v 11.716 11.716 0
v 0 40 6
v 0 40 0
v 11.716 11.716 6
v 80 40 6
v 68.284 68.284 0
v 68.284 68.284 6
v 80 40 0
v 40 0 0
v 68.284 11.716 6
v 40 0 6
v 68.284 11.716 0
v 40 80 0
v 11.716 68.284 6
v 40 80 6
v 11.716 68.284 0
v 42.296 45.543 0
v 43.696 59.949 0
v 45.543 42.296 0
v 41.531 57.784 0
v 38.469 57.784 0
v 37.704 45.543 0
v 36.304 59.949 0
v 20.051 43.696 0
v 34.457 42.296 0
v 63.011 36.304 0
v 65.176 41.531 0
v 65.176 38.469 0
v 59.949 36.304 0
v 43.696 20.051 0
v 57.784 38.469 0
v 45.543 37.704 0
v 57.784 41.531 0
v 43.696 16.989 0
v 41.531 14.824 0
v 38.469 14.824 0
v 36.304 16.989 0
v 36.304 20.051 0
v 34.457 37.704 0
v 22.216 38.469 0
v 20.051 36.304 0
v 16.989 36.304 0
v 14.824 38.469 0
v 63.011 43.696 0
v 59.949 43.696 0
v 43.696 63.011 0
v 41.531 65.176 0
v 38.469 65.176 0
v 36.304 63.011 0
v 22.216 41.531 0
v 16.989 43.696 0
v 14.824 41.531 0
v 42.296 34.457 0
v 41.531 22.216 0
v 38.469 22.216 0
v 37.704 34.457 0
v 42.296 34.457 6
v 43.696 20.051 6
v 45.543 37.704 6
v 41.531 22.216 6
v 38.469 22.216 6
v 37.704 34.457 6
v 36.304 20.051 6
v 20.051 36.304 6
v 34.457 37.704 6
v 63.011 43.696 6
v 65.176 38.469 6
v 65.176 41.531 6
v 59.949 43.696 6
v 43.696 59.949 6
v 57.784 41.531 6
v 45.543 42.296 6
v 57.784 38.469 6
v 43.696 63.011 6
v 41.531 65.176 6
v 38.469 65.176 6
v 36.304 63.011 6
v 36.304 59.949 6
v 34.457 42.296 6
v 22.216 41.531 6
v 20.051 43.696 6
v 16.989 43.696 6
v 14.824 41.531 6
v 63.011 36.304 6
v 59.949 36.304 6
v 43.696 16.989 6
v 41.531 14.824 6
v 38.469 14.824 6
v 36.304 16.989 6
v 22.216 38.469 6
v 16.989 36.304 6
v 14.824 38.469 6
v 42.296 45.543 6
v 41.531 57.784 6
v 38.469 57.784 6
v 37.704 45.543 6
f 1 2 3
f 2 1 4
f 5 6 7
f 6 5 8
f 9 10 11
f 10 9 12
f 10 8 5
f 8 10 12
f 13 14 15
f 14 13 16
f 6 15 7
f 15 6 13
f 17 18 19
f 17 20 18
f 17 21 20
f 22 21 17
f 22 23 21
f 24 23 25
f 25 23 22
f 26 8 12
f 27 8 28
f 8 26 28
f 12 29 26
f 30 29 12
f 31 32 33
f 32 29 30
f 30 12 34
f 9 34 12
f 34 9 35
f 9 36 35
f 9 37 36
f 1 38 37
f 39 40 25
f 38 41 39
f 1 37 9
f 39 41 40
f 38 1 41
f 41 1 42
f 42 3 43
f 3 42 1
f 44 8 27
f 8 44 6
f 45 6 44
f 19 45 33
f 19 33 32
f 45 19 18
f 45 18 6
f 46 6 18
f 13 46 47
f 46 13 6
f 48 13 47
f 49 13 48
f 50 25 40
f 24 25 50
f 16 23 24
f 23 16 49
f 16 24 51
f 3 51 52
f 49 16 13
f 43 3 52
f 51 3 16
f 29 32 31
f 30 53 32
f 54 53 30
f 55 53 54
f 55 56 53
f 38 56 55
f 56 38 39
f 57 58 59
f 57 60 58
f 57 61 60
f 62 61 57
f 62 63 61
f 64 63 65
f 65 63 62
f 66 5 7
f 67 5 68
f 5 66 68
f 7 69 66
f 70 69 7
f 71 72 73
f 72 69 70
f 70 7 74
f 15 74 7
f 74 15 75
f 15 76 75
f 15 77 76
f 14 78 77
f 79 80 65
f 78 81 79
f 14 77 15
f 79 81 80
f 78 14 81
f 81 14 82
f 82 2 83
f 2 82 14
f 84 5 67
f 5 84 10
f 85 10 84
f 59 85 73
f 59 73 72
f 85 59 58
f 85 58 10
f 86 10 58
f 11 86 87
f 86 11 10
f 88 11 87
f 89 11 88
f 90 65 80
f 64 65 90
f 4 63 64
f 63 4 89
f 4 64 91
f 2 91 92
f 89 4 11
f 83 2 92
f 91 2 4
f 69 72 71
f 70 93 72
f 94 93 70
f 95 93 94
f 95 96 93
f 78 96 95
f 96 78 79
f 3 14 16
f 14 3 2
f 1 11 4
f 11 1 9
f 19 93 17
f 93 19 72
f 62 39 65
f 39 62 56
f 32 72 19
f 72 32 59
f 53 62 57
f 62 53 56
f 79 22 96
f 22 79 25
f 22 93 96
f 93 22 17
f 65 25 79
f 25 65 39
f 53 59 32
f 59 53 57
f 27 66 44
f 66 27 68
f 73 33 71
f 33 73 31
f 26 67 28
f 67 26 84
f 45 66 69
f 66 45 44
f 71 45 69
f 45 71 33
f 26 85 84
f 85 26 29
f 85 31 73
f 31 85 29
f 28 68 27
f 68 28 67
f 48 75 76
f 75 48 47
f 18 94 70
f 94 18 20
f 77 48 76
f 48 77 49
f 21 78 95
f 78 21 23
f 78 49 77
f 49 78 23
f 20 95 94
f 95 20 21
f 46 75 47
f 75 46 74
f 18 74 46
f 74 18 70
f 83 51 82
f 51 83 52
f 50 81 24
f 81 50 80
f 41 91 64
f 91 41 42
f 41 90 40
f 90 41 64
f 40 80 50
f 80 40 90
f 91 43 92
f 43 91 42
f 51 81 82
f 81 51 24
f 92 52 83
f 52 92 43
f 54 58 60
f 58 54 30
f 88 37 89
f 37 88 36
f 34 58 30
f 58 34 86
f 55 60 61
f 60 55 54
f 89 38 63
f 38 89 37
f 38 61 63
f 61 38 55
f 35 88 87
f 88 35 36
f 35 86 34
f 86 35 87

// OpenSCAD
$fn = 32;

// ----------------------------------------------------------------------
// Polygon plate: 8-gon R40, 4 bolt windows
// ----------------------------------------------------------------------

// --- parameters (mm) ---
sides = 8;                // number of polygon sides
plate_r = 40;             // circumscribed radius of the polygon
bore_r = 6;               // centre bore radius
bolts = 4;                // number of bolt windows
ring_r = 21.48;           // bolt-circle radius
bolt_r = 4;               // bolt window radius
plate_t = 6;              // plate thickness, Z (extrusion height)

plate_d = 2 * plate_r;  // circumscribed diameter
bore_d = 2 * bore_r;  // centre bore diameter
bolt_d = 2 * bolt_r;  // bolt window diameter
ring_d = 2 * ring_r;  // bolt-circle diameter

profile = [[80, 40], [68.284, 68.284], [40, 80], [11.716, 68.284], [0, 40], [11.716, 11.716], [40, 0], [68.284, 11.716]];  // primary outline, 8 points, counter clockwise
void_1 = [[45.543, 42.296], [42.296, 45.543], [37.704, 45.543], [34.457, 42.296], [34.457, 37.704], [37.704, 34.457], [42.296, 34.457], [45.543, 37.704]];  // centre bore, 8 points
void_2 = [[65.176, 41.531], [63.011, 43.696], [59.949, 43.696], [57.784, 41.531], [57.784, 38.469], [59.949, 36.304], [63.011, 36.304], [65.176, 38.469]];  // bolt window 1, 8 points
void_3 = [[43.696, 63.011], [41.531, 65.176], [38.469, 65.176], [36.304, 63.011], [36.304, 59.949], [38.469, 57.784], [41.531, 57.784], [43.696, 59.949]];  // bolt window 2, 8 points
void_4 = [[22.216, 41.531], [20.051, 43.696], [16.989, 43.696], [14.824, 41.531], [14.824, 38.469], [16.989, 36.304], [20.051, 36.304], [22.216, 38.469]];  // bolt window 3, 8 points
void_5 = [[43.696, 20.051], [41.531, 22.216], [38.469, 22.216], [36.304, 20.051], [36.304, 16.989], [38.469, 14.824], [41.531, 14.824], [43.696, 16.989]];  // bolt window 4, 8 points

// --- the one profile operation ---
difference() {
  linear_extrude(height = plate_t) polygon(points = profile);
  translate([0, 0, -1])
    linear_extrude(height = plate_t + 2) polygon(points = void_1);
  translate([0, 0, -1])
    linear_extrude(height = plate_t + 2) polygon(points = void_2);
  translate([0, 0, -1])
    linear_extrude(height = plate_t + 2) polygon(points = void_3);
  translate([0, 0, -1])
    linear_extrude(height = plate_t + 2) polygon(points = void_4);
  translate([0, 0, -1])
    linear_extrude(height = plate_t + 2) polygon(points = void_5);
}
